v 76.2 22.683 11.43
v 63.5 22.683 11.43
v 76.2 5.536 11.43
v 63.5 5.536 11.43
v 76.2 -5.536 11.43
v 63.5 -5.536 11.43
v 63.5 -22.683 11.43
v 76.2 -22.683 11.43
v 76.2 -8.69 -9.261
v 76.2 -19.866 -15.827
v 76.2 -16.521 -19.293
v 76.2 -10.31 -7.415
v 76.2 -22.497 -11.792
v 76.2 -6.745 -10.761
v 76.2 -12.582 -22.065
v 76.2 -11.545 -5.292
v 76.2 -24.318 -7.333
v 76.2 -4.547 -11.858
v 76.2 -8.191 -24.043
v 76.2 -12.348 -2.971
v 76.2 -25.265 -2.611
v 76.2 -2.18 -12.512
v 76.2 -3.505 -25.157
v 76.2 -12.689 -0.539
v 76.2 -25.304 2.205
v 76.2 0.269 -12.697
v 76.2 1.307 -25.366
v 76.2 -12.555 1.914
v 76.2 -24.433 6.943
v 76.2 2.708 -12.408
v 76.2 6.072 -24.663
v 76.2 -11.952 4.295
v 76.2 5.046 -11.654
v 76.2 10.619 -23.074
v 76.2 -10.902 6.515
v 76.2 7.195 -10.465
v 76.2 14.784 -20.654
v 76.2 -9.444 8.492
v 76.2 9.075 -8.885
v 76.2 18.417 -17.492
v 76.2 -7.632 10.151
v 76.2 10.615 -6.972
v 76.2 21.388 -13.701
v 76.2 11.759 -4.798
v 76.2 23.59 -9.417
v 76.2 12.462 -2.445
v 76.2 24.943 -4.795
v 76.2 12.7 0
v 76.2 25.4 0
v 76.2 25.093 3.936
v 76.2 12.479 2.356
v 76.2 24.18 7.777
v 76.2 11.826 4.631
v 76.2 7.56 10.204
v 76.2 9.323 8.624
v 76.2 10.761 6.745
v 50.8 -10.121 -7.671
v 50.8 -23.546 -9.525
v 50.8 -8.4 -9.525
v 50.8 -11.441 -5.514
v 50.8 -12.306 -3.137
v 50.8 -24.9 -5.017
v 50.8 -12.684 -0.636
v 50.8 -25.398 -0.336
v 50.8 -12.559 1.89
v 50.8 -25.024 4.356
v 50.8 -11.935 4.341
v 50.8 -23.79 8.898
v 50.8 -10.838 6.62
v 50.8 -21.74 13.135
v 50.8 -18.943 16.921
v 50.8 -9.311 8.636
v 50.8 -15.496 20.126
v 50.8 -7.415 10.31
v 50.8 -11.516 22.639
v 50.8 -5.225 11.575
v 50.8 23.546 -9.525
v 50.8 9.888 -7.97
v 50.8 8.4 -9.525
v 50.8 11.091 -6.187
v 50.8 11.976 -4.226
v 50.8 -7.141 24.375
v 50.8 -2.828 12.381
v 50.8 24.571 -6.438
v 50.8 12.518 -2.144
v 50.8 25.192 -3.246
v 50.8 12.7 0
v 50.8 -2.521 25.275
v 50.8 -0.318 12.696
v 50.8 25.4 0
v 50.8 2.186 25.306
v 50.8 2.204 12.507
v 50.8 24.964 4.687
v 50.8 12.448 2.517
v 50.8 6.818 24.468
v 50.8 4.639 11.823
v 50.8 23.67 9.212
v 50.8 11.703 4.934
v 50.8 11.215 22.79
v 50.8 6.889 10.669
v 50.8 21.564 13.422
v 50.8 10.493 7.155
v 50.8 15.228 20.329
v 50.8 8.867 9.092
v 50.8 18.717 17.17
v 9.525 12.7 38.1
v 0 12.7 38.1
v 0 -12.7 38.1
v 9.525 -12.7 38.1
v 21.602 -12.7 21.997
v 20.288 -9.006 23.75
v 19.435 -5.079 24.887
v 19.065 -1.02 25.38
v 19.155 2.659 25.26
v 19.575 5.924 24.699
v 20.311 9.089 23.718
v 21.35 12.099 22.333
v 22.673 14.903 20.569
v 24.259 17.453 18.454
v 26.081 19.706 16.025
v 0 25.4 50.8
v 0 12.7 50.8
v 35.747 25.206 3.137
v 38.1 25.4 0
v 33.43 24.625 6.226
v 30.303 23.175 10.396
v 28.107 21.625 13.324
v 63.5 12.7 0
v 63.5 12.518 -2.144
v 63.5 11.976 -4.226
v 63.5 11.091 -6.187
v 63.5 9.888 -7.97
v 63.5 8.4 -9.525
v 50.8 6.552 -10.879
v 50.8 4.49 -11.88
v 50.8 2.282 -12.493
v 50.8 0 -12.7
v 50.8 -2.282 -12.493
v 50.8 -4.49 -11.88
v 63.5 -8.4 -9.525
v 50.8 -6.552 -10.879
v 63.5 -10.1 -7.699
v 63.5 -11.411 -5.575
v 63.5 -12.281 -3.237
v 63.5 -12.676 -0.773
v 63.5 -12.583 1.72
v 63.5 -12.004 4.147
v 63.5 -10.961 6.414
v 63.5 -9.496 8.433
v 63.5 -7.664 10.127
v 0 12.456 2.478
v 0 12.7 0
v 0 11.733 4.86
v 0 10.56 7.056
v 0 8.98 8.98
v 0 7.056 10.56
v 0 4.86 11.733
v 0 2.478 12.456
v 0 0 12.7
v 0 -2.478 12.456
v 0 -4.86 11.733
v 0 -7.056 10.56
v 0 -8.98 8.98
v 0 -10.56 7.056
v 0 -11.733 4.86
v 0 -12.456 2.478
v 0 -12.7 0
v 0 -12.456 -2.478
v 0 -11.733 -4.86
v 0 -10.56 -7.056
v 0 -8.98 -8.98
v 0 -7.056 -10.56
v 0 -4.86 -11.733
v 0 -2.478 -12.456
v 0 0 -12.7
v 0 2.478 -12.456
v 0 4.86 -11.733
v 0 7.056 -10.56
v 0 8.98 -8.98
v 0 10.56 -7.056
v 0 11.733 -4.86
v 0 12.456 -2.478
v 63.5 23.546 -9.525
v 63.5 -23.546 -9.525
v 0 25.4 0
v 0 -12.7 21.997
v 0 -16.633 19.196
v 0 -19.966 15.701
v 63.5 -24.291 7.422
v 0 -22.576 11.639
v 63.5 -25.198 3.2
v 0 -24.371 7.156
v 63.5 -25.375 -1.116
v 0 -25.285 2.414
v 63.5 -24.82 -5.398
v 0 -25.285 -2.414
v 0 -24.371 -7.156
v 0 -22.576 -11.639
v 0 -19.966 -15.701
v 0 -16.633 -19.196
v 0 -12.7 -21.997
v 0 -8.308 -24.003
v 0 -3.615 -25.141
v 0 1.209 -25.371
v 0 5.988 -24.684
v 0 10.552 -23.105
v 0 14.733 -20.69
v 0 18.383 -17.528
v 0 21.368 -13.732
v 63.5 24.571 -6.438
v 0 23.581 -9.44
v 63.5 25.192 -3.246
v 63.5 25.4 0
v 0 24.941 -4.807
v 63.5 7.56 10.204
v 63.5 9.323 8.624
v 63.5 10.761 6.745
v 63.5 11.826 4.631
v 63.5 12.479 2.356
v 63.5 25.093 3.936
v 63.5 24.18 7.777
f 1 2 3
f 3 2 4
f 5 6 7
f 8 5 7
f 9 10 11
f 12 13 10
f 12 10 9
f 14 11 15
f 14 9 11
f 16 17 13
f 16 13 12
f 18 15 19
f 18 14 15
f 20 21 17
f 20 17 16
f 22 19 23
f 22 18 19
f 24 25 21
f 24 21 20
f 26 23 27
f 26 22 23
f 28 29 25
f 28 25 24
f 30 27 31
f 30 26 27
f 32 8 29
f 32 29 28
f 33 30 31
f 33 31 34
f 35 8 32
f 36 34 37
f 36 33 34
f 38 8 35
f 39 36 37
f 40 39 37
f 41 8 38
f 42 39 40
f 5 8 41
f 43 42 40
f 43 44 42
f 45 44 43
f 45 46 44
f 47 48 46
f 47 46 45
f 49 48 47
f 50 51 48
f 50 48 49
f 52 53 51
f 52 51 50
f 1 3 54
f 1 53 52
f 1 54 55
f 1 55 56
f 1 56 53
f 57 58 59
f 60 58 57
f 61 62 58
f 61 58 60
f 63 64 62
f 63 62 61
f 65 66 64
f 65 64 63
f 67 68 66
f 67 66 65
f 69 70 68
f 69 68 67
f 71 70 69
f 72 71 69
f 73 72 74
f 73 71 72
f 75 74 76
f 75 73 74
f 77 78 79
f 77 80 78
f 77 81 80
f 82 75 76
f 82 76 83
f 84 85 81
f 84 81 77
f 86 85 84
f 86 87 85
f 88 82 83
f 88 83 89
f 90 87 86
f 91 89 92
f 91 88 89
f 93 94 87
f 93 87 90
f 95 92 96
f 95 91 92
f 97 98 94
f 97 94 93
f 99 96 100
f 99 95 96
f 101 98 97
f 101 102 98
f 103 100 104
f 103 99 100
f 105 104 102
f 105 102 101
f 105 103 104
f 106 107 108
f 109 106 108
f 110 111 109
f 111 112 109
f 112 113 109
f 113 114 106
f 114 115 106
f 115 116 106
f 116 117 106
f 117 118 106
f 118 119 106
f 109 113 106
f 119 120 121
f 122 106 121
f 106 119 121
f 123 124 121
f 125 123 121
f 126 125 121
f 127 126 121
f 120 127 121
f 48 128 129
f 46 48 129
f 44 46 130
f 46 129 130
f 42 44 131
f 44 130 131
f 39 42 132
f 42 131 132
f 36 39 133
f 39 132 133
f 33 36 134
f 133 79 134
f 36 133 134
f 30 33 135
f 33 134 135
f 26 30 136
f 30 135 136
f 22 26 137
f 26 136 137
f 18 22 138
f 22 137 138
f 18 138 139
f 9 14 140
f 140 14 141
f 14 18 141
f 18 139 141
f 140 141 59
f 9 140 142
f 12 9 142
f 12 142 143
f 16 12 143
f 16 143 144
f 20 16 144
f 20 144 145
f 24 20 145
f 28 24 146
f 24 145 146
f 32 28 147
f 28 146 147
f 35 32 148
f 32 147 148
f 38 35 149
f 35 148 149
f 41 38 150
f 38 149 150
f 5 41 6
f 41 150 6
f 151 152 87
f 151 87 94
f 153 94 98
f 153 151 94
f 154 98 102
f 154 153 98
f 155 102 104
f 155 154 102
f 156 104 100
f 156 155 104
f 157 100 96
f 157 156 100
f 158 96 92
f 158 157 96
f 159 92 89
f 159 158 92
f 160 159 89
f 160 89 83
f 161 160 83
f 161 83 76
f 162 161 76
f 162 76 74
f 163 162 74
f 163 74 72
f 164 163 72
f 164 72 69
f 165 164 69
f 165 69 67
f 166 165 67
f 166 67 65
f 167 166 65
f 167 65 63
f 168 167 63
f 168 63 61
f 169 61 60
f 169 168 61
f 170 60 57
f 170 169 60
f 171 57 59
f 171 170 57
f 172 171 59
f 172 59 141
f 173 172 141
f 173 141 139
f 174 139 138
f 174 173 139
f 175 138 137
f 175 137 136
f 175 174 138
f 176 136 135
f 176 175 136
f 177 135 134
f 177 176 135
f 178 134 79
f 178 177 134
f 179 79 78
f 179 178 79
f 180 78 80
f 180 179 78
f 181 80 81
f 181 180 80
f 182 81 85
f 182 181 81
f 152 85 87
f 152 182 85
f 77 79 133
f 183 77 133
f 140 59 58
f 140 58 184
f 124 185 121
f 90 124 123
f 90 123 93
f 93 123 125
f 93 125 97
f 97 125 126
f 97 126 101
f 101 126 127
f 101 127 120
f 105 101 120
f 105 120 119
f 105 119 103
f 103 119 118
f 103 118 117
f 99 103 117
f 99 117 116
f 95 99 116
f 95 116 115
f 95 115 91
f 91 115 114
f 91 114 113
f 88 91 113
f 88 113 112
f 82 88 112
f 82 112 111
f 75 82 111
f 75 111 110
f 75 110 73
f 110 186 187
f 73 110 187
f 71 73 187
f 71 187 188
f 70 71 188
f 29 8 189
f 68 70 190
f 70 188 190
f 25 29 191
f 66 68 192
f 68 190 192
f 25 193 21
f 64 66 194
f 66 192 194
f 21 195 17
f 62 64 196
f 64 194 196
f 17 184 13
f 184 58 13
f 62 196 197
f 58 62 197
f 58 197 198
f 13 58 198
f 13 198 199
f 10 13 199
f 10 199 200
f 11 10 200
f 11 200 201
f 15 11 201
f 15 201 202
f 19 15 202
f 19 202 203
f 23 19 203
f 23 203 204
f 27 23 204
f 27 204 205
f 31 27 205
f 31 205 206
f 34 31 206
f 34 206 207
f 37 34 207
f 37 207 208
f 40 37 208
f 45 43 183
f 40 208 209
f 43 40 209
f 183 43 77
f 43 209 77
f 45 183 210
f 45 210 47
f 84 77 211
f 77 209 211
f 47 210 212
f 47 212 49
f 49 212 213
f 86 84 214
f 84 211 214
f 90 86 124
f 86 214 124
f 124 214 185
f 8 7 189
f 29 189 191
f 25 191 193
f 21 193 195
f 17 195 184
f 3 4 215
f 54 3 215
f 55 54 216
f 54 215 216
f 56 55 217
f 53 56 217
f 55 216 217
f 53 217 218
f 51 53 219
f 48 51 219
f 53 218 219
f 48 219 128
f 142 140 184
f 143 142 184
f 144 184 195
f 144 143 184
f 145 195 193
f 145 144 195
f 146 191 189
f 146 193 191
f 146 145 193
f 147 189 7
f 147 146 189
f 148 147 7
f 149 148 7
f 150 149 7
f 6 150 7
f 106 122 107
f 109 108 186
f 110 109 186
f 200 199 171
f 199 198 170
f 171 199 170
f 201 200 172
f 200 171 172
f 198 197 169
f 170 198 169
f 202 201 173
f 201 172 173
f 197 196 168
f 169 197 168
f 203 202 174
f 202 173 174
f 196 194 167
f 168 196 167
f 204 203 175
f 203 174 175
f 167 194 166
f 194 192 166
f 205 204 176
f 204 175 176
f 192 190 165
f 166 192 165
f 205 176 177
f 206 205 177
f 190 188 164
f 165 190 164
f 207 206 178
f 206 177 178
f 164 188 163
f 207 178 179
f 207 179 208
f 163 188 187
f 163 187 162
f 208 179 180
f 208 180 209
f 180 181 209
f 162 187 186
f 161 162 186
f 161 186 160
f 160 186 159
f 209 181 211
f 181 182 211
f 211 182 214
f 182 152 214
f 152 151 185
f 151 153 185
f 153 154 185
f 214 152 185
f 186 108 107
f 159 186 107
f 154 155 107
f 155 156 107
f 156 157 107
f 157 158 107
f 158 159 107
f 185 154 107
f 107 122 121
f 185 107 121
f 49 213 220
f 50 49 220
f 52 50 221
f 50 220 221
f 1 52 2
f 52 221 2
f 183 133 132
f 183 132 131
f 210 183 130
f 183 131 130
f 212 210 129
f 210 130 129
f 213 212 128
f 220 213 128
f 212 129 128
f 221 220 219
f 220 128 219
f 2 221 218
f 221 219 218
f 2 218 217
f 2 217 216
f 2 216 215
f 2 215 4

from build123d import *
from build123d import SkipClean  # not in build123d's __all__

# Parameters (mm, degrees)
F0_R           = 25.4
F0_R_2         = 12.7
F1_DEPTH       = 50.8
F3_DEPTH       = 38.1
F5_DEPTH       = 50.801
F6_DEPTH       = 25.4
F7_DEPTH       = 50.801
F9_DEPTH       = 25.4
F10_W          = 12.7
F10_H          = 34.925
F11_DEPTH      = 25.401
F11_DEPTH_BACK = 25.4


# Not quite as in the source:
# - a feature names something its author has since deleted; it is built from what else it names


with BuildPart() as f1:
    # F0 (on Right) → F1 (new body)
    with BuildSketch(Plane.YZ):
        Circle(F0_R)
        Circle(F0_R_2, mode=Mode.SUBTRACT)
    extrude(amount=F1_DEPTH)

    # F2 (on Right) → F3 (join)
    with BuildSketch(Plane.YZ):
        Polygon((-12.7, 38.1), (-12.7, 0), (25.4, 0), (25.4, 50.8), (12.7, 50.8), (12.7, 38.1), align=None)
    extrude(amount=F3_DEPTH)

    # F4 (on face) → F5 (cut, through all)
    with BuildSketch(Plane(origin=(0, 25.4, 0), x_dir=(-1, 0, 0), z_dir=(0, 1, 0))):
        Polygon((-38.1, 0), (0, 50.8), (-38.1, 50.8), align=None)
    extrude(amount=-F5_DEPTH, mode=Mode.SUBTRACT)

    # F6 (add): a face of the model
    f6_faces = [f1.faces().sort_by_distance(p)[0] for p in [
        (38.1, 19.05, 0.5679612663),
    ]]
    extrude(f6_faces, amount=F6_DEPTH)

    # F0 (on Right) → F7 (cut, through all)
    with BuildSketch(Plane.YZ):
        Circle(F0_R_2)
    extrude(amount=F7_DEPTH, mode=Mode.SUBTRACT)

    # F8 (on face) → F9 (join)
    with BuildSketch(Plane.YZ.offset(50.8)):
        with BuildLine():
            Line((-5.5358016583, 11.43), (-22.6829252964, 11.43))
            ThreePointArc((-22.6829252964, 11.43), (-5.8742530365, -24.7113971937), (25.4, 0))
            ThreePointArc((25.4, 0), (24.7113971937, 5.8742530365), (22.6829252964, 11.43))
            Line((22.6829252964, 11.43), (5.5358016583, 11.43))
            ThreePointArc((5.5358016583, 11.43), (10.7609172718, 6.7448246434), (12.7, 0))
            ThreePointArc((12.7, 0), (-6.7448246434, -10.7609172718), (-5.5358016583, 11.43))
        make_face()
    with SkipClean():  # cleaning this boolean's faces spoils the solid; the shape is the same uncleaned
        extrude(amount=F9_DEPTH)

    # F10 (on Front) → F11 (cut, two sides)
    with BuildSketch(Plane.XZ) as f11_sk:
        with Locations((57.15, 7.9375)):
            Rectangle(F10_W, F10_H)
    extrude(amount=-F11_DEPTH, mode=Mode.SUBTRACT)
    extrude(f11_sk.sketch, amount=F11_DEPTH_BACK, mode=Mode.SUBTRACT)


solid = f1.part
